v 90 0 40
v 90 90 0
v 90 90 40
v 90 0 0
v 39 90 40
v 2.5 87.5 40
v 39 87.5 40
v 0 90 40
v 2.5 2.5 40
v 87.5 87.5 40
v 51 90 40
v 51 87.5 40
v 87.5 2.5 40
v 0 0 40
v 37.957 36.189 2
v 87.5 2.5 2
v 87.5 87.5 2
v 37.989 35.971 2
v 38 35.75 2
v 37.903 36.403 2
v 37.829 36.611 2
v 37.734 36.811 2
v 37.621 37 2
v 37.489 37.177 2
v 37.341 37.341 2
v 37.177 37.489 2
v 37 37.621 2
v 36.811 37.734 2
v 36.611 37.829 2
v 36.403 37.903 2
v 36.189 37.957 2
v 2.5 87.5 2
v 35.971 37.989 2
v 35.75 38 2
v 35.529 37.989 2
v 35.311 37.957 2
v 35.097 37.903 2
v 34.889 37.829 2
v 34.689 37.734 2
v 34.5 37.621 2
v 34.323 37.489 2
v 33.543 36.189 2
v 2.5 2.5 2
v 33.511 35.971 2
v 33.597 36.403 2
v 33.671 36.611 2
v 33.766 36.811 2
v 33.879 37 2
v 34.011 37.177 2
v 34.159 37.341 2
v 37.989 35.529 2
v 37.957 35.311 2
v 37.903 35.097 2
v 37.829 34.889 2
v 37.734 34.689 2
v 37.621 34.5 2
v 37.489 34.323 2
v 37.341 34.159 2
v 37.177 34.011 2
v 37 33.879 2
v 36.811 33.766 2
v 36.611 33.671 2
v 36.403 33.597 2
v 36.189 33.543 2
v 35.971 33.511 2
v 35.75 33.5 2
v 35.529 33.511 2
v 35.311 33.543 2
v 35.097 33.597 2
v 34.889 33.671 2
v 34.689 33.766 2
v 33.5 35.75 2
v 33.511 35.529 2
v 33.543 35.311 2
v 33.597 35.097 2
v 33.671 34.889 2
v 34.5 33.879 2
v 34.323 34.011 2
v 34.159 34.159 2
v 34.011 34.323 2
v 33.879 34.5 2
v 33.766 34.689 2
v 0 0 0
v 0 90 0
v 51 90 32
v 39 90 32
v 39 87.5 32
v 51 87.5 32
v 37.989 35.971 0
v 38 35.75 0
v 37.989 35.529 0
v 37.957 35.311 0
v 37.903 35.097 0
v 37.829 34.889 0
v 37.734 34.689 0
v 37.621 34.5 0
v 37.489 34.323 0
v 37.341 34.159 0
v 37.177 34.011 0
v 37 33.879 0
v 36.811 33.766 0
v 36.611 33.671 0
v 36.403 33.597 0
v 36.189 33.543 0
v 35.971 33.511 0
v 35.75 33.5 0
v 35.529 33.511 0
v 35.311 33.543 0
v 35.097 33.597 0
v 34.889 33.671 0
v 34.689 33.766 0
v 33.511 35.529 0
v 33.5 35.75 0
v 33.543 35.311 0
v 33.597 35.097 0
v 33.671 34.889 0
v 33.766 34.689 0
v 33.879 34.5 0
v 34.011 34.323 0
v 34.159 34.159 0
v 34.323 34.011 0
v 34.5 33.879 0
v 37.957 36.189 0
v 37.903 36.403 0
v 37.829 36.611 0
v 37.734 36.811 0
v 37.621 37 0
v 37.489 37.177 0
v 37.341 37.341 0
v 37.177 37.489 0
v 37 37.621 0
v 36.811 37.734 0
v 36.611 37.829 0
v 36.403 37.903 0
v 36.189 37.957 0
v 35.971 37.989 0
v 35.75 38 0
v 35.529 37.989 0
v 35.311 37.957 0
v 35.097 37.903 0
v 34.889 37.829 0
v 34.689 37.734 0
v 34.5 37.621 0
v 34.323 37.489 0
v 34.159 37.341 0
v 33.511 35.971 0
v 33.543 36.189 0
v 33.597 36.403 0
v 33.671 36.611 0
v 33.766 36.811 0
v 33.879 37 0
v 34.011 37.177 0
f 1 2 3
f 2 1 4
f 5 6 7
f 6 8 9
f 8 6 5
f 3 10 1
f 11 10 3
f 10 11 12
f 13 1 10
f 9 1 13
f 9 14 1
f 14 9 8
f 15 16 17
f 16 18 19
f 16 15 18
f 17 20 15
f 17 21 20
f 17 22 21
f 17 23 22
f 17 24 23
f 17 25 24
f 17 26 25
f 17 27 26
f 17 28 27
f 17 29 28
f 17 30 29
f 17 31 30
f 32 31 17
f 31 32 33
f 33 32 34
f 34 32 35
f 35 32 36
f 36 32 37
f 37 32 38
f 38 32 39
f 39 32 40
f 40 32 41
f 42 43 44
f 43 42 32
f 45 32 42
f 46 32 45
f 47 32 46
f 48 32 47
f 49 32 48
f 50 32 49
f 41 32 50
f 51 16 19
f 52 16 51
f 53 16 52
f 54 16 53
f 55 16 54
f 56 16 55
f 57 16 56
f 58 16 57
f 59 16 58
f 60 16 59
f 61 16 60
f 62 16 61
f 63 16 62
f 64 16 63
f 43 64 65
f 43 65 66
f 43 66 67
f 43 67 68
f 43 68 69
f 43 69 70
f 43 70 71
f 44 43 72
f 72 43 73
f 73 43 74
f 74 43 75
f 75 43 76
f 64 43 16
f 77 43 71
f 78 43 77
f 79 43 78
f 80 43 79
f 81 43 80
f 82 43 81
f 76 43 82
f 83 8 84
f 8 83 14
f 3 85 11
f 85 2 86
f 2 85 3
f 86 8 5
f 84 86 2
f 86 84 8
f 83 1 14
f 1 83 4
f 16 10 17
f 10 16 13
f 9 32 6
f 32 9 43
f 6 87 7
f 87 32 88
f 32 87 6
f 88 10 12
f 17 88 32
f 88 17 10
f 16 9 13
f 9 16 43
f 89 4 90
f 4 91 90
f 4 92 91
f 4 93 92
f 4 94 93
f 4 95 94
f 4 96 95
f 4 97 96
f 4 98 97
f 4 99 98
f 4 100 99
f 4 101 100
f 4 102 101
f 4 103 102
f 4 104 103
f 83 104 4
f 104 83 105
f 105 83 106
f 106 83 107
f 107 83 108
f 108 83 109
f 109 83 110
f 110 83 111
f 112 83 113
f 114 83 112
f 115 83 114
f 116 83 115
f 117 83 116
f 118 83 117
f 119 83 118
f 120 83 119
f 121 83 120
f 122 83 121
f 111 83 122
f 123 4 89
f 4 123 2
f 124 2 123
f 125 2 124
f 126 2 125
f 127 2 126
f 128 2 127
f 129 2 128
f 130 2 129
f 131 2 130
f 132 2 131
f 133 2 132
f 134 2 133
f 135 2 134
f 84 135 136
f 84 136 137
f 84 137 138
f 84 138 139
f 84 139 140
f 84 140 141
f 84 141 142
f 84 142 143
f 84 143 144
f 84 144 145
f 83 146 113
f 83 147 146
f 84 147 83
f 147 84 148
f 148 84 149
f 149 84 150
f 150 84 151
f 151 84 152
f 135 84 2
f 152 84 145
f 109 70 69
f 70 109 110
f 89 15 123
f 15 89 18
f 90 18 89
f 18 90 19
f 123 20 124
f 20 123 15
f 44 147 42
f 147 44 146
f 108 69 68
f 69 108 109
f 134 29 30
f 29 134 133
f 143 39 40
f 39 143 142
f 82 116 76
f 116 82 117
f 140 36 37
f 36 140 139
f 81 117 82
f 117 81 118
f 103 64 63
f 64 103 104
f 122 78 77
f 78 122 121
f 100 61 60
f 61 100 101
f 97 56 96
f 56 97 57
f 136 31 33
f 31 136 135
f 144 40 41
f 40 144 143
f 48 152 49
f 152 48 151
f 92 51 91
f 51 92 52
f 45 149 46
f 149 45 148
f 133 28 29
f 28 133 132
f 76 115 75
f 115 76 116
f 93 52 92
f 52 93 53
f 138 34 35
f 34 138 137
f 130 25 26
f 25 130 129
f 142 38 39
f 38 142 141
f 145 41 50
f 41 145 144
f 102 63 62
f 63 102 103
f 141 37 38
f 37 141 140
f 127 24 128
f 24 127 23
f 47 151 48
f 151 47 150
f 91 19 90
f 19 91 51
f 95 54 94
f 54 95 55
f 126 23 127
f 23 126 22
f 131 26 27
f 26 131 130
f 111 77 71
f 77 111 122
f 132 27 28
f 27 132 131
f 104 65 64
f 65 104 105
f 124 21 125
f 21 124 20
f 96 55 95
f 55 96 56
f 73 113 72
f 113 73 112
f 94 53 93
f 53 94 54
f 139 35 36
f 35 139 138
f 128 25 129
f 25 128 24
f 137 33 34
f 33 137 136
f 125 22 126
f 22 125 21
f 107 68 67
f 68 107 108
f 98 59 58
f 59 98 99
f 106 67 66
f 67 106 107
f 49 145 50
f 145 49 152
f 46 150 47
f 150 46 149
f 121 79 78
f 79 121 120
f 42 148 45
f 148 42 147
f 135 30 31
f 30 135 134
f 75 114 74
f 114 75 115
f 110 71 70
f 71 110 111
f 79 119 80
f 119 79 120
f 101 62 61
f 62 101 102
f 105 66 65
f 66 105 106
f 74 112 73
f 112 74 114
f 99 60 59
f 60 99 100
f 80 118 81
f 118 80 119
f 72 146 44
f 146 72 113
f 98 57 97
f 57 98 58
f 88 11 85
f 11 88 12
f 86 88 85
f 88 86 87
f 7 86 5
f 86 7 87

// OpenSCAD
// --- Dimensions (mm) ---
outer_width = 90;          // Outer width and length of the box
outer_length = 90;         // Outer length and width of the box
wall_thickness = 2.5;       // Thickness of the four vertical walls
top_plate_thickness = 2;    // Thickness of the top plate (the stirring surface)
total_height = 40;         // Total height of the housing
screw_hole_diameter = 4.5;  // Diameter for M4 screw holes
screw_pattern_size = 71.5;  // Distance between screw holes (square pattern)
notch_width = 12;          // Width of the cable notch
notch_depth = 8;           // How far down the notch goes from the top edge
notch_height = 8;          // Height of the notch (from z=32 to z=40)

// --- Constants ---
$fn = 64;

// --- Implementation ---

// The part is modeled upside down: 
// The top plate (stirring surface) is at Z = 0 to Z = 2.
// The walls rise from Z = 2 to Z = 40.

module housing() {
    difference() {
        // Main Body
        union() {
            // The Top Plate (Base of the box in this orientation)
            cube([outer_width, outer_length, top_plate_thickness]);
            
            // The Four Walls
            translate([0, 0, top_plate_thickness])
            difference() {
                // Outer boundary of the walls
                cube([outer_width, outer_length, total_height - top_plate_thickness]);
                
                // Hollow out the inside
                translate([wall_thickness, wall_thickness, -0.01])
                cube([outer_width - 2*wall_thickness, outer_length - 2*wall_thickness, total_height]);
            }
        }

        // 1. Screw Holes (through the top plate)
        // We use a small offset to ensure they cut through the bottom face
        for (i = [-1, 1], j = [-1, 1]) {
            translate([i * screw_pattern_size / 2, j * screw_pattern_size / 2, -0.01])
            cylinder(d = screw_hole_diameter, h = top_plate_thickness + 0.02);
        }

        // 2. Cable Notch
        // Located in one wall, centered along the wall, reaching 8mm down from the open edge.
        // Open edge is at Z = 40. Notch is from Z = 32 to Z = 40.
        // We'll place it on the wall at Y = outer_length (the "front" wall).
        translate([outer_width/2 - notch_width/2, outer_length - wall_thickness - 0.1, total_height - notch_height])
        cube([notch_width, wall_thickness + 0.2, notch_height + 0.1]);
    }
}

// Render the part
housing();
